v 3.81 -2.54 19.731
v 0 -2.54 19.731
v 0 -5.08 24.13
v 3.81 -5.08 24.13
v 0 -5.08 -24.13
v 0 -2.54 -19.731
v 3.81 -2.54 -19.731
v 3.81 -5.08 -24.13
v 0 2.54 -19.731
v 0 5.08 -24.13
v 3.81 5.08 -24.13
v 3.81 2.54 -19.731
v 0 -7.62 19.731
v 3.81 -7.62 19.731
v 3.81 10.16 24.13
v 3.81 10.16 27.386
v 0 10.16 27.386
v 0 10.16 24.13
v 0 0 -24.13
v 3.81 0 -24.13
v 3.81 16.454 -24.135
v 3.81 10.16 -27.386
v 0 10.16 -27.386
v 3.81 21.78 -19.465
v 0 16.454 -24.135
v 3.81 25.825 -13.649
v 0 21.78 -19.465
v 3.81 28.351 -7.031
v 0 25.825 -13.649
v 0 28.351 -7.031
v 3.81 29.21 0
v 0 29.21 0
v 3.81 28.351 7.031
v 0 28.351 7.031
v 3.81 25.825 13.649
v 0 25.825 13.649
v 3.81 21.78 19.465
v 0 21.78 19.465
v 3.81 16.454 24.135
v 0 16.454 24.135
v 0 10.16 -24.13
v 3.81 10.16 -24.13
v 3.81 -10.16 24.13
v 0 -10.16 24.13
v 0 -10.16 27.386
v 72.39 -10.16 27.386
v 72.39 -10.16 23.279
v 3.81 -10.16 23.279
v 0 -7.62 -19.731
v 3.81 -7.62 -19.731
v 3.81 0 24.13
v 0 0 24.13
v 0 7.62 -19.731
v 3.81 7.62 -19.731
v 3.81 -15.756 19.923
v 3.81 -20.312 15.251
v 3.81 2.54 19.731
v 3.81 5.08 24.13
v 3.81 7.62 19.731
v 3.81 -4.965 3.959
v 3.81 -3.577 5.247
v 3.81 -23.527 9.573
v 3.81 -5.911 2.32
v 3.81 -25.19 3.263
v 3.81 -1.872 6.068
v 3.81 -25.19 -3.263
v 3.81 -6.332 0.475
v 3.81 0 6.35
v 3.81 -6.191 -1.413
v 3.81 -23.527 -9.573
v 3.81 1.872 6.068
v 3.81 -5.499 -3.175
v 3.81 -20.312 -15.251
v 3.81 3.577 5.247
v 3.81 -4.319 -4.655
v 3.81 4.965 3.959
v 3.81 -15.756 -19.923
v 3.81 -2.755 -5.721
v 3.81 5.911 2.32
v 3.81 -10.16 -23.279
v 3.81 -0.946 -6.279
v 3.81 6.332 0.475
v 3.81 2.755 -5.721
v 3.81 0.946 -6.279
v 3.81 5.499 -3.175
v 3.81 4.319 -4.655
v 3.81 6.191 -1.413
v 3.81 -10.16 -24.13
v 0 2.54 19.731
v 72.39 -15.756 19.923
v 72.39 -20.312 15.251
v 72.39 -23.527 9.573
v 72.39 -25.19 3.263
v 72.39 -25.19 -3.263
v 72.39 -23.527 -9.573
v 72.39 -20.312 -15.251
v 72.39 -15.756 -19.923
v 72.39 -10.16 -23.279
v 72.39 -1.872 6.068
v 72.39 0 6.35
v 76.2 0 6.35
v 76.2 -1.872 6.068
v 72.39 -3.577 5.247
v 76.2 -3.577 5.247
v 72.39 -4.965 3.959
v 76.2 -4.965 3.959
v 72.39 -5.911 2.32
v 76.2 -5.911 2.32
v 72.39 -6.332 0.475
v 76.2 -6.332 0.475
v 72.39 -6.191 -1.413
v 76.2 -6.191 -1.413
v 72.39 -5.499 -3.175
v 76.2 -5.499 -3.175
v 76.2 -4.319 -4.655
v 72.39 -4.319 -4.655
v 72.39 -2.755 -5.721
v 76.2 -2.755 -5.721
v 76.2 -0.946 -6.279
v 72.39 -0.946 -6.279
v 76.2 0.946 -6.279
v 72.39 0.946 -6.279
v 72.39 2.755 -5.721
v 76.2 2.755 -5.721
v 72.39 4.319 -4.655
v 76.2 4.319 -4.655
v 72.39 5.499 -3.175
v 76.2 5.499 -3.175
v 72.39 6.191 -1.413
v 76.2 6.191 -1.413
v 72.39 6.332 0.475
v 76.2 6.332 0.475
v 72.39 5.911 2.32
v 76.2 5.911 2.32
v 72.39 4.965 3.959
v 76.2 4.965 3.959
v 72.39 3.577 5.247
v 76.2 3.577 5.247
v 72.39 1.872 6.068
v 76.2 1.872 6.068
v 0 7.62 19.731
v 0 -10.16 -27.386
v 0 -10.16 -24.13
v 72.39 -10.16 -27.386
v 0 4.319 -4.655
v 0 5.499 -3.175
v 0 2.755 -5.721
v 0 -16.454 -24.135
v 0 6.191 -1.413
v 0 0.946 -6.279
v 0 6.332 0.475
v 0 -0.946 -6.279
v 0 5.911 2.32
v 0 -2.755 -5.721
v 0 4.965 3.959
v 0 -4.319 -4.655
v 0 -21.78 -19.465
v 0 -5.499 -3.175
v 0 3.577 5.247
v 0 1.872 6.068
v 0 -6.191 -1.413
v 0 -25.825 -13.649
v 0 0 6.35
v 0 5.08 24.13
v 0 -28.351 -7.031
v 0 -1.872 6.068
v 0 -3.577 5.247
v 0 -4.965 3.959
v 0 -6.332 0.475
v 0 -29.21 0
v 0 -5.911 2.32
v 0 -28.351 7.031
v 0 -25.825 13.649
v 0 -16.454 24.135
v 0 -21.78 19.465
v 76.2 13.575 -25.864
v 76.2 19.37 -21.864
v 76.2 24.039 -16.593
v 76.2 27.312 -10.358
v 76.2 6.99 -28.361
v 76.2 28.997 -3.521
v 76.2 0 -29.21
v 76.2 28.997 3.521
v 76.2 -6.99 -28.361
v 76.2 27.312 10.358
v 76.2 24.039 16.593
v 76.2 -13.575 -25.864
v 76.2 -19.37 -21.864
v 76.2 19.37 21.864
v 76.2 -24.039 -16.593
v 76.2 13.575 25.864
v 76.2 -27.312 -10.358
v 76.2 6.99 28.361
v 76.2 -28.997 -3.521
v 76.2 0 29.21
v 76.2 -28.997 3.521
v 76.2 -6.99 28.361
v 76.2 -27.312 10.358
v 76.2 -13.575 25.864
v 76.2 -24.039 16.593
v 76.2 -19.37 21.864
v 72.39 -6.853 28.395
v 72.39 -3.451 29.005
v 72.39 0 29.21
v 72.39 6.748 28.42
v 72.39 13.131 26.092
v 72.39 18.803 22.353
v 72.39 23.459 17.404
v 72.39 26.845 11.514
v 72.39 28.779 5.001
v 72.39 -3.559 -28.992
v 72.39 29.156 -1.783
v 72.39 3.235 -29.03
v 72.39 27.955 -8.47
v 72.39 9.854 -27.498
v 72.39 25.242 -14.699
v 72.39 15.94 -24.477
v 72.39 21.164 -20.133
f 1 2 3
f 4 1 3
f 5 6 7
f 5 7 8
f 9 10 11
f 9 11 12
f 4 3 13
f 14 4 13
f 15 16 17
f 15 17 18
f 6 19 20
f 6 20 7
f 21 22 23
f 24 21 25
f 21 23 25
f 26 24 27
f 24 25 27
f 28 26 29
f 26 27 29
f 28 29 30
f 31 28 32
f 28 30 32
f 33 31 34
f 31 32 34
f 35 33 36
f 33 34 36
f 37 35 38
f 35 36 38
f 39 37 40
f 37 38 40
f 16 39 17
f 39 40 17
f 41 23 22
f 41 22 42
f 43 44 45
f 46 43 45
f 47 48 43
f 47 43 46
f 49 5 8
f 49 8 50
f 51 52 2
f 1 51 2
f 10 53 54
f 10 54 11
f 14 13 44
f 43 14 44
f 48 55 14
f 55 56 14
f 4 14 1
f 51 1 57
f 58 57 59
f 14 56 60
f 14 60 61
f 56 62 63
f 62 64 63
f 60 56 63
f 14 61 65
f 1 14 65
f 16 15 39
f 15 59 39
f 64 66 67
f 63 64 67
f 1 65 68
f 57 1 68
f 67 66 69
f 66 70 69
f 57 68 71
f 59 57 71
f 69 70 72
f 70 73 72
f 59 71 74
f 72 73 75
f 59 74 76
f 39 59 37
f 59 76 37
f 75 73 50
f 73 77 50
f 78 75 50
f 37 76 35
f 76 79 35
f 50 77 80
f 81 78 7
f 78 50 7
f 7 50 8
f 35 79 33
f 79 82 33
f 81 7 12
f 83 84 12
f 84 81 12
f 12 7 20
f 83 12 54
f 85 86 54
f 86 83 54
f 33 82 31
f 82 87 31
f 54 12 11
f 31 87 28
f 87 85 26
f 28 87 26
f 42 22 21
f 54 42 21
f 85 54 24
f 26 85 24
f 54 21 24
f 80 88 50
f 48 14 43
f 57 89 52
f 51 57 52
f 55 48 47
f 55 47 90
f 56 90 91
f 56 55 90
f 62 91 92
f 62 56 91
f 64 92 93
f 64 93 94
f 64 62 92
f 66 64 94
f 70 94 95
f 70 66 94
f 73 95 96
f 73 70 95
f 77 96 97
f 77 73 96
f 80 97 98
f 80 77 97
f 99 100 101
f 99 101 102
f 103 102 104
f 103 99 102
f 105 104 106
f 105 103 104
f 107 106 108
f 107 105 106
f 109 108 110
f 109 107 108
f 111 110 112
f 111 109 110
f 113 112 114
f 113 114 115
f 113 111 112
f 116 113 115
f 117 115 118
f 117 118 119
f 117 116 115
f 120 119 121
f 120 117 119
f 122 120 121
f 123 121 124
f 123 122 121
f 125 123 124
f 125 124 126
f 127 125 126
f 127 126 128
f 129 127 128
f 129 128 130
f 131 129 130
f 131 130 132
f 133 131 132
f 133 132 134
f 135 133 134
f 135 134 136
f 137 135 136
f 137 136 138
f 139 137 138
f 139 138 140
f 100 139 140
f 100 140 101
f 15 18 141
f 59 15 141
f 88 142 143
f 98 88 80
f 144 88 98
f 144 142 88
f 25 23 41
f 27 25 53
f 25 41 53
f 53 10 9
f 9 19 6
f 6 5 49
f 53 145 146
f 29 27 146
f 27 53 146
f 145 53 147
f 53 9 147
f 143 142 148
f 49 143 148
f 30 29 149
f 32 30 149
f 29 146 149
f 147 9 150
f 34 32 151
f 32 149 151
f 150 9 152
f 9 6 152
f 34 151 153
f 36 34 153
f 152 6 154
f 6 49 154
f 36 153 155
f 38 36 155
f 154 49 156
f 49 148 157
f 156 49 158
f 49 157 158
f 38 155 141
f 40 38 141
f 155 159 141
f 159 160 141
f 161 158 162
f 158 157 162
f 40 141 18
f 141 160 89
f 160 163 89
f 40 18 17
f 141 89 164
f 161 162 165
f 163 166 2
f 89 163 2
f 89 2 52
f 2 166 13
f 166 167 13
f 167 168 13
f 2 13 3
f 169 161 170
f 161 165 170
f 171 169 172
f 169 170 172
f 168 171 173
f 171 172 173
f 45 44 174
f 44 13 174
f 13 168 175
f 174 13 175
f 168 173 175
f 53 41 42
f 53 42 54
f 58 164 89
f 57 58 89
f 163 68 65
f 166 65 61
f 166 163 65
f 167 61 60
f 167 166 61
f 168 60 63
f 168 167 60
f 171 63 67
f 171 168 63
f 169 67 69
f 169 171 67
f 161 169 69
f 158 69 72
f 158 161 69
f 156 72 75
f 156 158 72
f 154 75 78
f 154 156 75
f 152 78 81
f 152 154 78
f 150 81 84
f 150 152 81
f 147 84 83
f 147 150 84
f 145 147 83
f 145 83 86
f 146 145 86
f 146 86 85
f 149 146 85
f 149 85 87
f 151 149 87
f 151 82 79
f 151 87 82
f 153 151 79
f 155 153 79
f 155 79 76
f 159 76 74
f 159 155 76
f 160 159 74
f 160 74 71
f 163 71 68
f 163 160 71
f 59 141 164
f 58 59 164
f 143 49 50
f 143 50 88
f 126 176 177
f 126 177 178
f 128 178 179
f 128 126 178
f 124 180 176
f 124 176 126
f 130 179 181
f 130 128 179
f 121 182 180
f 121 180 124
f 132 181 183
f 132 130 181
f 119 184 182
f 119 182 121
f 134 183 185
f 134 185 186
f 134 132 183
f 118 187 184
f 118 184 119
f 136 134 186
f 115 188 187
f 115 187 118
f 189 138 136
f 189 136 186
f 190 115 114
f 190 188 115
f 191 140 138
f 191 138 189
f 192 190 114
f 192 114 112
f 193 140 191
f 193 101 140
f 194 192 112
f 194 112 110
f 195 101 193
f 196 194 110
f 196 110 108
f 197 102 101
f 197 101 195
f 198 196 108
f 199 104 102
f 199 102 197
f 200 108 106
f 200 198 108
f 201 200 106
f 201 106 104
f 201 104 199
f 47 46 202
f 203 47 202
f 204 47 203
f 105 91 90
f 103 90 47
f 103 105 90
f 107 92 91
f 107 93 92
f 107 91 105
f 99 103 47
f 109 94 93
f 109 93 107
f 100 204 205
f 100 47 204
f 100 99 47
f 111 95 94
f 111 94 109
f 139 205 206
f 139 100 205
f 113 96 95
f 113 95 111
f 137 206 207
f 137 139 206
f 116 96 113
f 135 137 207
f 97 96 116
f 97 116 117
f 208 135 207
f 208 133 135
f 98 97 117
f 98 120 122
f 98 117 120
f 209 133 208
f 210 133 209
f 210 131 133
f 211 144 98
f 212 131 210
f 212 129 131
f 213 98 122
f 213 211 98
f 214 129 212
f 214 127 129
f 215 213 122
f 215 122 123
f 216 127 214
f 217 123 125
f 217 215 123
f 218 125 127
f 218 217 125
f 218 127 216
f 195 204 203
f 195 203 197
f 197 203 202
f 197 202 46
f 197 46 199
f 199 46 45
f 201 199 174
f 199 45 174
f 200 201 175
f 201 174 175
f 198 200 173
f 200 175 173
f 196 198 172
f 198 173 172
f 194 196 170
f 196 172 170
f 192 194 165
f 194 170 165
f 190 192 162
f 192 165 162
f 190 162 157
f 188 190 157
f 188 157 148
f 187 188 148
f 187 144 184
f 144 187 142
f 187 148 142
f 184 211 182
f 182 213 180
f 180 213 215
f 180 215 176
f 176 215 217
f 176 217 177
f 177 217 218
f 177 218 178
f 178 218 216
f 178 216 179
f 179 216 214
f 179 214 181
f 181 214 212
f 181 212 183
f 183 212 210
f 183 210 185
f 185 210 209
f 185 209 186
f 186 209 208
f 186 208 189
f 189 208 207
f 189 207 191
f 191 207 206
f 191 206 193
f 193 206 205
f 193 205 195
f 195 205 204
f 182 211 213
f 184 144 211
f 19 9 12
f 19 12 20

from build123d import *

# Parameters (mm, degrees)
SKETCH3_R               = 29.21
SKETCH3_R_2             = 6.35
BOSS_EXTRUDE1_DEPTH     = 76.2
CUT_EXTRUDE1_DEPTH      = 87.676918496
CUT_EXTRUDE1_DEPTH_BACK = 87.676918496
SKETCH4_W               = 68.58
SKETCH4_H               = 78.74
SHELL4_START            = 3.81
SHELL4_DEPTH            = 68.58
CUT_EXTRUDE2_DEPTH      = 3.81


# Read off the part's stored shape, not the designer's step: Shell4
with BuildPart() as part:
    # Sketch3 → Boss-Extrude1 (new body)
    with BuildSketch(Plane(origin=(0, 0, 0), x_dir=(0, 0, -1), z_dir=(1, 0, 0))):
        with Locations(Location((0, 0, 0), (0, 0, 180))):
            Circle(SKETCH3_R)
        with Locations(Location((0, 0, 0), (0, 0, 180))):
            Circle(SKETCH3_R_2, mode=Mode.SUBTRACT)
    extrude(amount=BOSS_EXTRUDE1_DEPTH)

    # Sketch4 → Cut-Extrude1 (cut, two sides: drawn at the far end of the back side and taken through both)
    with BuildSketch(Plane.XY.offset(-CUT_EXTRUDE1_DEPTH_BACK)):
        with Locations((38.1, 29.21)):
            Rectangle(SKETCH4_W, SKETCH4_H)
    extrude(amount=CUT_EXTRUDE1_DEPTH + CUT_EXTRUDE1_DEPTH_BACK, mode=Mode.SUBTRACT)

    # Shell4 outline → Shell4 (cut)
    with BuildSketch(Plane.YZ.offset(SHELL4_START)):
        with BuildLine():
            ThreePointArc((-10.16, 23.27948453), (-25.4, 0), (-10.16, -23.27948453))
            Line((-10.16, -23.27948453), (-10.16, 23.27948453))
        make_face()
    extrude(amount=SHELL4_DEPTH, mode=Mode.SUBTRACT)

    # Sketch5 → Cut-Extrude2 (cut)
    with BuildSketch(Plane.ZY):
        Polygon((24.13, 10.16), (19.730590949, 7.62), (24.13, 5.08), (19.730590949, 2.54), (24.13, 0), (19.730590949, -2.54), (24.13, -5.08), (19.730590949, -7.62), (24.13, -10.16), (29.21, -10.16), (29.21, 10.16), align=None)
        Polygon((-29.21, 10.16), (-24.13, 10.16), (-19.730590949, 7.62), (-24.13, 5.08), (-19.730590949, 2.54), (-24.13, 0), (-19.730590949, -2.54), (-24.13, -5.08), (-19.730590949, -7.62), (-24.13, -10.16), (-29.21, -10.16), align=None)
    extrude(amount=-CUT_EXTRUDE2_DEPTH, mode=Mode.SUBTRACT)


solid = part.part
